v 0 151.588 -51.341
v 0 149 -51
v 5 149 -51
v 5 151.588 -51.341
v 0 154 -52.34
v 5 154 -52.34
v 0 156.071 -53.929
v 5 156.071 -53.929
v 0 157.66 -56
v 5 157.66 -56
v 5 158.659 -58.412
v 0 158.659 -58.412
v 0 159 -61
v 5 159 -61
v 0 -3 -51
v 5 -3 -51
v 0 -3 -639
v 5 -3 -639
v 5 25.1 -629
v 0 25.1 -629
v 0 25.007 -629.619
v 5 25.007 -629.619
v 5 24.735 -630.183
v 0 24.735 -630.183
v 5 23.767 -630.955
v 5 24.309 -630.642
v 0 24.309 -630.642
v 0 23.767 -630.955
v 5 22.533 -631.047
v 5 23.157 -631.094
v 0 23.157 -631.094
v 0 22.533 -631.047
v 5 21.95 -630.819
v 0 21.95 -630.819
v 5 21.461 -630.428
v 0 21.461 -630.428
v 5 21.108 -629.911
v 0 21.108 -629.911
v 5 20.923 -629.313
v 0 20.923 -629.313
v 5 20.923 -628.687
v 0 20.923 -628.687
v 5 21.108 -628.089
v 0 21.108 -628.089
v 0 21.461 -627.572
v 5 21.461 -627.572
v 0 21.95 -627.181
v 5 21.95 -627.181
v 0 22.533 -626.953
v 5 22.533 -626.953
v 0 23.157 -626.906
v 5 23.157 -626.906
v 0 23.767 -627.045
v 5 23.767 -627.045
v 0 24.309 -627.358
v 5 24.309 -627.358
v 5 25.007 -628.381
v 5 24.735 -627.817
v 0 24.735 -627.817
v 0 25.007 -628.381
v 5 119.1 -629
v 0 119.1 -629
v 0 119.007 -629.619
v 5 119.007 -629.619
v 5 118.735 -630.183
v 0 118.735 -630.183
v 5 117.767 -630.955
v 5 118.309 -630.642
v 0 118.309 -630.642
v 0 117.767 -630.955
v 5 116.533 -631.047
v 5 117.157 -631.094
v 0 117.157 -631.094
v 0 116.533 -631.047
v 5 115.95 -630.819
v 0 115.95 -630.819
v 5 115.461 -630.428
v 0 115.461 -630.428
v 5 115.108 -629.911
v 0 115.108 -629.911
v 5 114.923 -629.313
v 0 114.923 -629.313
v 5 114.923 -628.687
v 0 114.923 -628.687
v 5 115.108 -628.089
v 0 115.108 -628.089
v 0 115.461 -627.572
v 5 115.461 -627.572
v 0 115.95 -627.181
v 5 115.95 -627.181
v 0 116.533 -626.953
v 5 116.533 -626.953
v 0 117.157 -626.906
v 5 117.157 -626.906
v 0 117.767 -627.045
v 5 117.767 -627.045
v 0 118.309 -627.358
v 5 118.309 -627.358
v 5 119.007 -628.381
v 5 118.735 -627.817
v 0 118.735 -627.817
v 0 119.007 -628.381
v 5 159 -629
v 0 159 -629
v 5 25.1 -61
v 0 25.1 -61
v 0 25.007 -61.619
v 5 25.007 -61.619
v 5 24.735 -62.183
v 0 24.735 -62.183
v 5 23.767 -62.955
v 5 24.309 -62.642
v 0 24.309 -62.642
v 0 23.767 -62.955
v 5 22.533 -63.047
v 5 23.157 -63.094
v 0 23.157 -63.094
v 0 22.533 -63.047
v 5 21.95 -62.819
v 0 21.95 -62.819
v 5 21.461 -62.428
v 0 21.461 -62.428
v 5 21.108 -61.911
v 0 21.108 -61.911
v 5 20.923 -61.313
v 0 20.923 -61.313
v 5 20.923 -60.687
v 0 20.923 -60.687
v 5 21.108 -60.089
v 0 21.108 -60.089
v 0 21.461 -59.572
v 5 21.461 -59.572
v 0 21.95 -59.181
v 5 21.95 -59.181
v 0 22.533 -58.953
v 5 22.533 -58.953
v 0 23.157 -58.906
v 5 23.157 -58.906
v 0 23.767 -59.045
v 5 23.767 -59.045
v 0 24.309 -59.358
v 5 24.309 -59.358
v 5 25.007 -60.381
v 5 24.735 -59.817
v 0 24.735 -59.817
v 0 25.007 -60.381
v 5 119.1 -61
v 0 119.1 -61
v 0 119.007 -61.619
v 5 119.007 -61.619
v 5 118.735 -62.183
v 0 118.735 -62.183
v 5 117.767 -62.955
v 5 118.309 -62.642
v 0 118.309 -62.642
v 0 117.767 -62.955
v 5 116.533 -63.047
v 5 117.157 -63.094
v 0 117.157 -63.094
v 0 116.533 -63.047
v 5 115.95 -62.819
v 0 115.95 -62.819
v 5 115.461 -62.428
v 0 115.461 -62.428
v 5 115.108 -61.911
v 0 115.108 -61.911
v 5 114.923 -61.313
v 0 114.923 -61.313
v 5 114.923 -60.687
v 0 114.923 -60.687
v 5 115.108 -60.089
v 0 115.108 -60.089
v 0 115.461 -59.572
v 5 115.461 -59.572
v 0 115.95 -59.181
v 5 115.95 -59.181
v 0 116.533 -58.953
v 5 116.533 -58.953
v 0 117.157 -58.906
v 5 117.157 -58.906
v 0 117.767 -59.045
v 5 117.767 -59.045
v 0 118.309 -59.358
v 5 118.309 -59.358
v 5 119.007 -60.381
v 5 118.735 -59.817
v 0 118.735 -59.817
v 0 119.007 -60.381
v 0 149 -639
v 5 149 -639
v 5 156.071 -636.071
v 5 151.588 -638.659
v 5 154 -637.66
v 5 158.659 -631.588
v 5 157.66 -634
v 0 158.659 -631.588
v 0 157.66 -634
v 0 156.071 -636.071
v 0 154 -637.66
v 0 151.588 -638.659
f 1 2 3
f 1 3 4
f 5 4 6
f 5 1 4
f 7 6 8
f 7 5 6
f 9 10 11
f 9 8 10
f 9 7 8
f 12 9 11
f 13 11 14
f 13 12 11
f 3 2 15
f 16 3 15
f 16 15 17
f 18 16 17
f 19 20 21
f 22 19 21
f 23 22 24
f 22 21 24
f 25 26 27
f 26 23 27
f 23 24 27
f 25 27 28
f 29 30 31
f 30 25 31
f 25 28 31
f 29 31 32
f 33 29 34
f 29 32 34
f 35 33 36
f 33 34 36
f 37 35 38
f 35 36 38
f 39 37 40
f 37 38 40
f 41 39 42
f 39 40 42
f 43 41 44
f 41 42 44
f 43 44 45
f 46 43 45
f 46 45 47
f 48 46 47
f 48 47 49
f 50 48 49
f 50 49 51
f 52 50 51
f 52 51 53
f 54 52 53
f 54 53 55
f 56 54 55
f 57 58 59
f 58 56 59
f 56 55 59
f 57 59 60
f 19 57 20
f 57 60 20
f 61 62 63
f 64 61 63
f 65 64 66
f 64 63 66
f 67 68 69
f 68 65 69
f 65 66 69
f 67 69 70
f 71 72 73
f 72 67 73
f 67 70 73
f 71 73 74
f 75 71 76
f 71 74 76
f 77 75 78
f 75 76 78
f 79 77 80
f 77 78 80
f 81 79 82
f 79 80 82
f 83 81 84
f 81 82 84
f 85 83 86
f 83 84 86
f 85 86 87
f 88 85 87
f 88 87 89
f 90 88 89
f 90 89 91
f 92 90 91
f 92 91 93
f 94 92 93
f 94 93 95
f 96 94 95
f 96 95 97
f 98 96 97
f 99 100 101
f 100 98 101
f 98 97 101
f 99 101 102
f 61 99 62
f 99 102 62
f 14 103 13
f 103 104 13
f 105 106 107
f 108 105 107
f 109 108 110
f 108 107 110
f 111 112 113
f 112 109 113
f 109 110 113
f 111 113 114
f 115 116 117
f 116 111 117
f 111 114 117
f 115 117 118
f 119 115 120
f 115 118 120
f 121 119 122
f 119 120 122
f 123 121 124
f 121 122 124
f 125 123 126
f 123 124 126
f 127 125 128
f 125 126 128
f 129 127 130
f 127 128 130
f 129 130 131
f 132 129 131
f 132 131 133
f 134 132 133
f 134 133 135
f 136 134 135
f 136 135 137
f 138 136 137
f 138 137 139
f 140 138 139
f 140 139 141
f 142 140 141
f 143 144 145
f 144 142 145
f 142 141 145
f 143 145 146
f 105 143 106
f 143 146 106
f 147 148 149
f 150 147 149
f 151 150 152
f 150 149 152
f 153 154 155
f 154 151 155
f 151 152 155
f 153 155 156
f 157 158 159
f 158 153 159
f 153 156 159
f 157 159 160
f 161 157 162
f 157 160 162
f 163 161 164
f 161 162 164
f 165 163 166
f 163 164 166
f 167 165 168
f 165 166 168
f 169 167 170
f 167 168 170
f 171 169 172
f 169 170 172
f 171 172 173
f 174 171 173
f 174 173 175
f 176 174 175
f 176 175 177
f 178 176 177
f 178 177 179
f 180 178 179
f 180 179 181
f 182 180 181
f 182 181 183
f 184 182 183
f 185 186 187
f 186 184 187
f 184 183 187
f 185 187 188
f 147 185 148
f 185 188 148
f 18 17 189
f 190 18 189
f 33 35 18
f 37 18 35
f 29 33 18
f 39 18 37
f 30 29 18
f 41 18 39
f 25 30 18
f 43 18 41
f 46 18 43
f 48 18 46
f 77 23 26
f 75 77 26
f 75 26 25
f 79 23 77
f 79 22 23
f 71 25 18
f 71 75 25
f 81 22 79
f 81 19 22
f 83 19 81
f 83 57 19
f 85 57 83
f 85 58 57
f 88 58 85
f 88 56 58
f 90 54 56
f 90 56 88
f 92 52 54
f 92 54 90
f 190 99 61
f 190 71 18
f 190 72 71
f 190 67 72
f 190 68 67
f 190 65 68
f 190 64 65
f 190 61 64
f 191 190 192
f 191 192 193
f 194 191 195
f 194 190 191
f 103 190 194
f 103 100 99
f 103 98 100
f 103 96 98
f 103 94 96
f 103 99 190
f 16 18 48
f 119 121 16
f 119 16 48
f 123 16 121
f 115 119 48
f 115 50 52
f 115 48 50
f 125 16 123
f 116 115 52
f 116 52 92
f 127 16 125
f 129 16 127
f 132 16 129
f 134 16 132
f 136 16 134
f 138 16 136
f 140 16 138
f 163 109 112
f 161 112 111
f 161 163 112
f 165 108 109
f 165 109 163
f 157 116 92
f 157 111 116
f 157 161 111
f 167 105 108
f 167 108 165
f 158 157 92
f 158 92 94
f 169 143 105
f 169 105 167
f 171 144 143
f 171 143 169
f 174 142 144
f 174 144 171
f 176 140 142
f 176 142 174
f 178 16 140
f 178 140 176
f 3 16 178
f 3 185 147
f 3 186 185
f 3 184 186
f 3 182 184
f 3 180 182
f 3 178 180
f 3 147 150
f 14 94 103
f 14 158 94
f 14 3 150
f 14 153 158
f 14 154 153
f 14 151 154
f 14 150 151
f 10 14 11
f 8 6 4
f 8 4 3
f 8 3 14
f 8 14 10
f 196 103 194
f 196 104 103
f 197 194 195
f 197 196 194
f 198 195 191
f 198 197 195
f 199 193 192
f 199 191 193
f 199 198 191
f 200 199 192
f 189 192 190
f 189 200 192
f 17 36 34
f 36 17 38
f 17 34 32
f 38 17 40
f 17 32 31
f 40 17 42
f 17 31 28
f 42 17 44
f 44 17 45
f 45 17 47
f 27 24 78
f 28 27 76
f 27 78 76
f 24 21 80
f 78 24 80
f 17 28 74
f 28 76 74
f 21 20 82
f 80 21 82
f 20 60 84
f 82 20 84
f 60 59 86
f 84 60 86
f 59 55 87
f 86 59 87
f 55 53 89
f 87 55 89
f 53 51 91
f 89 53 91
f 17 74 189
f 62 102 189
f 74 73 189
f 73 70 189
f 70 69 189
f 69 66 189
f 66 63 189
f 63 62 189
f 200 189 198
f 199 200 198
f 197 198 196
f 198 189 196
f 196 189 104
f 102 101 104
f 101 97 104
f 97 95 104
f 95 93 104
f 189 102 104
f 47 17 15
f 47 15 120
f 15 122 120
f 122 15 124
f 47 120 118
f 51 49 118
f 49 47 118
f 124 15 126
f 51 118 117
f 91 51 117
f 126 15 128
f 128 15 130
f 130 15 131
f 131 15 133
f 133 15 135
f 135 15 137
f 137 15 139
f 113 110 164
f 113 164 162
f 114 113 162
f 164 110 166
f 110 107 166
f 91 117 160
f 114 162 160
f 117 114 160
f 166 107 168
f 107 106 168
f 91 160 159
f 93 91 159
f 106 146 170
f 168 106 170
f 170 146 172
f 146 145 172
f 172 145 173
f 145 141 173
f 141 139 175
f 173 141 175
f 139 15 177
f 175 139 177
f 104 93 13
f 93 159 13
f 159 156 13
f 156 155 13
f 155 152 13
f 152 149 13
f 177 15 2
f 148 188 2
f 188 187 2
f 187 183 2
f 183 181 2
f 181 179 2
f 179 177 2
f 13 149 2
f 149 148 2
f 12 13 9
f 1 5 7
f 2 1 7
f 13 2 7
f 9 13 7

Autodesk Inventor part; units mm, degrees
ref_plane "YZ Plane" through (0, 0, 0) normal (1, 0, 0) x (0, 1, 0)
ref_plane "XZ Plane" through (0, 0, 0) normal (0, 1, 0) x (-1, 0, 0)
ref_plane "XY Plane" through (0, 0, 0) normal (0, 0, 1) x (1, 0, 0)
sketch "Skizze1" plane through (0, 0, 0) normal (1, 0, 0) x (0, 1, 0)
  line L0 (149, -51) -> (-3, -51)
  line L1 (-3, -51) -> (-3, -639)
  line L2 (-3, -639) -> (149, -639)
  line L3 (159, -629) -> (159, -61)
  arc A0 (159, -61) -> (149, -51) centre (149, -61) ccw
  line L4 (-3, -51) -> (149, -51) projected
  line L5 (-3, -51) -> (-3, -639) projected
  arc A1 (149, -639) -> (159, -629) centre (149, -629) ccw
  line L6 (117, -61) -> (23, -61) construction
  line L7 (23, -61) -> (23, -629) construction
  line L8 (23, -629) -> (117, -629) construction
  line L9 (117, -629) -> (117, -61) construction
  circle A2 centre (117, -61) radius 2.1
  circle A3 centre (117, -629) radius 2.1
  circle A4 centre (23, -629) radius 2.1
  circle A5 centre (23, -61) radius 2.1
  point P0 (0, 0)
  point P1 (73, -639)
  dimension "d0" = 10
  dimension "d3" = 588
  dimension "d4" = 162
  dimension "d5" = 0
  dimension "d6" = 0
  dimension "d7" = 10
  dimension "d8" = 4.2
  dimension "d9" = 4.2
  dimension "d10" = 4.2
  dimension "d11" = 4.2
  dimension "d12" = 568
  dimension "d13" = 94
  dimension "d14" = 26
  dimension "d15" = 10
extrude "Extrusion1" add sketch "Skizze1" along normal blind 5 contours A0 L3 A1 L2 L1 L0 | A2 | A3 | A4 | A5
extrude "Extrusion2" cut sketch "Skizze1" along normal blind 5 contours A2 | A3 | A4 | A5
properties part number "Plexiglasabdeckung" material "Polycarbonat, rauchfarben"
